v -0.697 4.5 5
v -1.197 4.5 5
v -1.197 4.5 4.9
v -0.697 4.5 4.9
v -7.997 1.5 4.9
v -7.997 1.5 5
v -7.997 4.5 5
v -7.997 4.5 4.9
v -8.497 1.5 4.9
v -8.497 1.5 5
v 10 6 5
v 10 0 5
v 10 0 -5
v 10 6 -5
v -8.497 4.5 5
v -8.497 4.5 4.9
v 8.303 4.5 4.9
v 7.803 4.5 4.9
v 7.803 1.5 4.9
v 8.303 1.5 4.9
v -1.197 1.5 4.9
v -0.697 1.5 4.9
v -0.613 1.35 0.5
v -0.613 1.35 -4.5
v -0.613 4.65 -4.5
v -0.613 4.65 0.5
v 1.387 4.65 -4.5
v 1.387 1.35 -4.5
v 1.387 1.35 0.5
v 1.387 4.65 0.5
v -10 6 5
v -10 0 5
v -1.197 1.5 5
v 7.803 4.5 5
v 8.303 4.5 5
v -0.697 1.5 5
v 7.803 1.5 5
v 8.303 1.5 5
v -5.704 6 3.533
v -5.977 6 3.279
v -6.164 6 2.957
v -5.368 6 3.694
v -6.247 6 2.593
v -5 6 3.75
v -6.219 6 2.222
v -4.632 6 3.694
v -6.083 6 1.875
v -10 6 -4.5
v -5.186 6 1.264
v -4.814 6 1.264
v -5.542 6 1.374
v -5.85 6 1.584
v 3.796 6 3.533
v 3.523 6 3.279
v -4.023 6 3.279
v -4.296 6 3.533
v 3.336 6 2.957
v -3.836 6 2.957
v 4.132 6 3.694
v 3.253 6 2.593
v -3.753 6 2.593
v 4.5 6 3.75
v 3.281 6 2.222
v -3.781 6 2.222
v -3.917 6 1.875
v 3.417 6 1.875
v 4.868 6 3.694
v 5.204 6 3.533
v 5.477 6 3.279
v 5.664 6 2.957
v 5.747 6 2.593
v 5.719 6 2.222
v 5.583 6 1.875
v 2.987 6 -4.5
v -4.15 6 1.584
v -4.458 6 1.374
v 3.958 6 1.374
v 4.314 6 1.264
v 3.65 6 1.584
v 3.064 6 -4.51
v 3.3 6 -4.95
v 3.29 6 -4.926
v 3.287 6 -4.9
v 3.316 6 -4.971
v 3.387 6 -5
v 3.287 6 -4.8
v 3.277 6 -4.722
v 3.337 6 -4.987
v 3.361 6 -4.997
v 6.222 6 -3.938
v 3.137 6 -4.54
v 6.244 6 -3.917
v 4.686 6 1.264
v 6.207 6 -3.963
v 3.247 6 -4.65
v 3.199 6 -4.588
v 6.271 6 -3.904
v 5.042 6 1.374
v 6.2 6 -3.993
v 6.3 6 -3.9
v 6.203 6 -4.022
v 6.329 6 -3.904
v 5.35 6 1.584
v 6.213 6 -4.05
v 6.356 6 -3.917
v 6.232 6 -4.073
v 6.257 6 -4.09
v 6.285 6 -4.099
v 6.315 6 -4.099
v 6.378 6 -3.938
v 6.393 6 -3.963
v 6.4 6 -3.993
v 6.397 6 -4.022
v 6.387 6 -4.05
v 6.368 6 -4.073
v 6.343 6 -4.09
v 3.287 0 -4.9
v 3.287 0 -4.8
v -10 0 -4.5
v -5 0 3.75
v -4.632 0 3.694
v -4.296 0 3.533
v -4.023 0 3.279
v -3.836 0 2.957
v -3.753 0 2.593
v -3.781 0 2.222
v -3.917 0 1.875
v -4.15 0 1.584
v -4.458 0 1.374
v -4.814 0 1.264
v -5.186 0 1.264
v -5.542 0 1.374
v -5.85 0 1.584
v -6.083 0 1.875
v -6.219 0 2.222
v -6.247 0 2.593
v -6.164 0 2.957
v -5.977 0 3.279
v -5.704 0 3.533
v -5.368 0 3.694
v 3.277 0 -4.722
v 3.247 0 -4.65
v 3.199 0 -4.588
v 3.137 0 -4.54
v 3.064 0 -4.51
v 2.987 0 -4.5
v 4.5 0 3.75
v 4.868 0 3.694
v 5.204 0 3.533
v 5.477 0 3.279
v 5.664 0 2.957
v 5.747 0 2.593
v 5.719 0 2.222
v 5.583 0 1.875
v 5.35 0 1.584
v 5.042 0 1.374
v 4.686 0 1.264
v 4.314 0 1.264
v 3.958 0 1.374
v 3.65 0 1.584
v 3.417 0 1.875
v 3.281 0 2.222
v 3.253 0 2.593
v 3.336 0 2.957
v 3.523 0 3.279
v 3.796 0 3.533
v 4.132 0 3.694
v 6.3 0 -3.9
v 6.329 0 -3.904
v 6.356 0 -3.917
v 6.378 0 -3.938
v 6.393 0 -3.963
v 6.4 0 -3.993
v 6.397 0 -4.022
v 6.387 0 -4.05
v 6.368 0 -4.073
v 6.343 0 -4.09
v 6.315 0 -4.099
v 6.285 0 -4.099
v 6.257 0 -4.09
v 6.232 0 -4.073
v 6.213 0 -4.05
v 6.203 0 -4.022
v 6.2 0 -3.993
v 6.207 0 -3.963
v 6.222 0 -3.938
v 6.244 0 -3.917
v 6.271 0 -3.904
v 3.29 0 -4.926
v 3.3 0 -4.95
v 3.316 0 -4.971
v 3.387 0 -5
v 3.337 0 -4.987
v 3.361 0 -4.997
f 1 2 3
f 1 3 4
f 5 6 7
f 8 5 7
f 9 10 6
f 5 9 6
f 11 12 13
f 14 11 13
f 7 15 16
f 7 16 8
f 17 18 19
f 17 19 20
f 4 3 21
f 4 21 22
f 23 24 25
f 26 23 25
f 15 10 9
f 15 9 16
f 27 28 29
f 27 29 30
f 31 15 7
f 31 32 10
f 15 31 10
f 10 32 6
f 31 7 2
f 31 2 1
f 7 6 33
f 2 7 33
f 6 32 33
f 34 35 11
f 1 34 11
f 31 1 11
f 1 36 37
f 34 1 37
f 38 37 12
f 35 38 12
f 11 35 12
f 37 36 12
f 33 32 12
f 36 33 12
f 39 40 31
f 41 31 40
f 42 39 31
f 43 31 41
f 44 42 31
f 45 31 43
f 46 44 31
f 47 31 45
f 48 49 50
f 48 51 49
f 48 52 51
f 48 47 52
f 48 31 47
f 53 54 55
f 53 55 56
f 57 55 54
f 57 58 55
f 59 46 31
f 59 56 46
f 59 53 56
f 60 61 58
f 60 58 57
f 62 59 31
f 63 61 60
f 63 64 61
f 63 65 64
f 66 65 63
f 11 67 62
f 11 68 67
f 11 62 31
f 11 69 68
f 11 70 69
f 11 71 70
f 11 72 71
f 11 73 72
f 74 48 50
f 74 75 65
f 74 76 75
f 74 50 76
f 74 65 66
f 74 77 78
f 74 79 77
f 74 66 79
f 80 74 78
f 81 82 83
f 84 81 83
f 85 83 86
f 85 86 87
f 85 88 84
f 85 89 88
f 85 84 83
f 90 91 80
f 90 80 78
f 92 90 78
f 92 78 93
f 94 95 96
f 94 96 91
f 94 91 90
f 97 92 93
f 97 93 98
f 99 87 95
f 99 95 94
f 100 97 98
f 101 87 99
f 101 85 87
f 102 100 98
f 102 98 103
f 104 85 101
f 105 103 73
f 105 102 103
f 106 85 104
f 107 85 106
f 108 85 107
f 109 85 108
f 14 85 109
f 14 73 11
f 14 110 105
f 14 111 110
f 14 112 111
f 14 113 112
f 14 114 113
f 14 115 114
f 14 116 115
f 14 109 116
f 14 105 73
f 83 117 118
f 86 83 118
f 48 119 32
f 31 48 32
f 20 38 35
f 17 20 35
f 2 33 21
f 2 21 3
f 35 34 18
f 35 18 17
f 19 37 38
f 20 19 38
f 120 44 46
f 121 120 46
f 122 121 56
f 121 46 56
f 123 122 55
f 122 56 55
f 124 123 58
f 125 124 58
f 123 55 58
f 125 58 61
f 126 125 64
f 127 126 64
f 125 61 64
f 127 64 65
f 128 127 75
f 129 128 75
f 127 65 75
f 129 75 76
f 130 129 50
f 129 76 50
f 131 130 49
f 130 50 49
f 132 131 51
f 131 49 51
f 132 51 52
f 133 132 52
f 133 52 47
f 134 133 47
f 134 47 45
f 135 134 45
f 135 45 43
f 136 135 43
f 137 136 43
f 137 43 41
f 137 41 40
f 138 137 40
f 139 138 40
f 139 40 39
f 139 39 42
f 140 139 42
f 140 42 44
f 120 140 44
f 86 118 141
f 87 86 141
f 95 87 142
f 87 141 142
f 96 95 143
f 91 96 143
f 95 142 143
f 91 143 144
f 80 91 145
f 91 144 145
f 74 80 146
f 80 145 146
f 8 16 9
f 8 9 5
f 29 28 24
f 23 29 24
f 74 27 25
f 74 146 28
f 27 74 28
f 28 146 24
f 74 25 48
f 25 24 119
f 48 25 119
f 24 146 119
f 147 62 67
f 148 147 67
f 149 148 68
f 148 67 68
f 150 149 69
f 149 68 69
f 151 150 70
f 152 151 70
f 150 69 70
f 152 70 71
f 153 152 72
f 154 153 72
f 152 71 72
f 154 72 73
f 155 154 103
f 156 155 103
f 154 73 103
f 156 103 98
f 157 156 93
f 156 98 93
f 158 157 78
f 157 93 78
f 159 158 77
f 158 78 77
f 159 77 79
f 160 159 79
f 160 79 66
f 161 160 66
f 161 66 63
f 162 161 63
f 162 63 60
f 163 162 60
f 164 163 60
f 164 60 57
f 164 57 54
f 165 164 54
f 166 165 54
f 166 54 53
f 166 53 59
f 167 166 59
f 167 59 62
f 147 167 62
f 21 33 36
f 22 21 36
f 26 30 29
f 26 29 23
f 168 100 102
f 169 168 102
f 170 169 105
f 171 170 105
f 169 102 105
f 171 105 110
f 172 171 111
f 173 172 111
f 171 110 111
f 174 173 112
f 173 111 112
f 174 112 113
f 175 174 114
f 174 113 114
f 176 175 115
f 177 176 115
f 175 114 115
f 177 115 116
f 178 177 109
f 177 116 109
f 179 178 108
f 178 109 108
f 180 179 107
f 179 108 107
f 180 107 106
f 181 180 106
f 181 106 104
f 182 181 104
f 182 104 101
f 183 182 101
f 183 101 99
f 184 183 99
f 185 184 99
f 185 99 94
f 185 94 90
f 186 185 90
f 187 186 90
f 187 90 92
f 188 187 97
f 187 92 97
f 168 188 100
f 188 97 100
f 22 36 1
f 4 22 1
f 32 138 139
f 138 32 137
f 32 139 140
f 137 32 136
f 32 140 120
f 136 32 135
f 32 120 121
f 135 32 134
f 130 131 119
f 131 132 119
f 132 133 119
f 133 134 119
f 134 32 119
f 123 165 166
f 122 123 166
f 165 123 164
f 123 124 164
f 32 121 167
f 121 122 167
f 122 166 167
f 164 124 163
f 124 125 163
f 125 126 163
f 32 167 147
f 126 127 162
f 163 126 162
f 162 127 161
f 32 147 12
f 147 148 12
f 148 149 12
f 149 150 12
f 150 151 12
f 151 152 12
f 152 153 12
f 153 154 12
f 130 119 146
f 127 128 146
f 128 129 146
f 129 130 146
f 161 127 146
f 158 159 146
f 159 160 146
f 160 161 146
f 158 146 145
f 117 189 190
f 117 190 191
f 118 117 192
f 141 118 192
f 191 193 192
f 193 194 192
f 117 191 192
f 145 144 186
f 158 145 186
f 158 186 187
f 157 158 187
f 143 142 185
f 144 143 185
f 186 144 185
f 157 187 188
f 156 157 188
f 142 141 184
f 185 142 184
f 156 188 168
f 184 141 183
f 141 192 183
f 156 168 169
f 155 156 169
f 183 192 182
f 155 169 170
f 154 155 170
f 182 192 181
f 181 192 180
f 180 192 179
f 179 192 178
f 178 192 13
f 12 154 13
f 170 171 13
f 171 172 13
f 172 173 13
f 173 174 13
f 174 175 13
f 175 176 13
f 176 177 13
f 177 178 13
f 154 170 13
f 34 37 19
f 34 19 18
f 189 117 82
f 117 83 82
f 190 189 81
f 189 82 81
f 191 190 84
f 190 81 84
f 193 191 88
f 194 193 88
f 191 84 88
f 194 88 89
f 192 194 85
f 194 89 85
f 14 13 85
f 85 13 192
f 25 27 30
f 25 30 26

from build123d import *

# Parameters (mm, degrees)
SALIENTE_EXTRUIR2_DEPTH = 6
CROQUIS2_R              = 1.25
CORTAR_EXTRUIR1_DEPTH   = 10
REDONDEO1_R             = 0.1
CROQUIS3_W              = 2
CROQUIS3_H              = 3.3
CORTAR_EXTRUIR2_DEPTH   = 5
CROQUIS4_R              = 0.1
CORTAR_EXTRUIR3_DEPTH   = 6
CROQUIS5_W              = 0.5
CROQUIS5_H              = 3
CORTAR_EXTRUIR4_DEPTH   = 0.1


with BuildPart() as part:
    # Croquis1 → Saliente-Extruir2 (new body)
    with BuildSketch(Plane(origin=(0, 0, 0), x_dir=(1, 0, 0), z_dir=(0, 1, 0))):
        with BuildLine():
            Line((2.986733927, 4.5), (-10, 4.5))
            Line((-10, 4.5), (-10, -5))
            Line((-10, -5), (10, -5))
            Line((10, -5), (10, 5))
            Line((10, 5), (3.286733927, 5))
            Line((3.286733927, 5), (3.286733927, 4.8))
            ThreePointArc((3.286733927, 4.8), (3.198865961, 4.587867966), (2.986733927, 4.5))
        make_face()
    extrude(amount=SALIENTE_EXTRUIR2_DEPTH)

    # Croquis2 → Cortar-Extruir1 (cut)
    with BuildSketch(Plane(origin=(0, 6, 0), x_dir=(1, 0, 0), z_dir=(0, 1, 0))):
        with Locations(Location((-5, -2.5, 0), (0, 0, 270))):
            Circle(CROQUIS2_R)
        with Locations(Location((4.5, -2.5, 0), (0, 0, 270))):
            Circle(CROQUIS2_R)
    extrude(amount=-CORTAR_EXTRUIR1_DEPTH, mode=Mode.SUBTRACT)

    # Redondeo1
    redondeo1_edges = [part.edges().sort_by_distance(p)[0] for p in [
        (3.286733927, 3, -5),
    ]]
    fillet(redondeo1_edges, radius=REDONDEO1_R)

    # Croquis3 → Cortar-Extruir2 (cut)
    with BuildSketch(Plane(origin=(0, 0, -4.5), x_dir=(-1, 0, 0), z_dir=(0, 0, -1))):
        with Locations((-0.386733927, 3)):
            Rectangle(CROQUIS3_W, CROQUIS3_H)
    extrude(amount=-CORTAR_EXTRUIR2_DEPTH, mode=Mode.SUBTRACT)

    # Croquis4 → Cortar-Extruir3 (cut)
    with BuildSketch(Plane(origin=(0, 6, 0), x_dir=(1, 0, 0), z_dir=(0, 1, 0))):
        with Locations(Location((6.3, 4, 0), (0, 0, 270))):
            Circle(CROQUIS4_R)
    extrude(amount=-CORTAR_EXTRUIR3_DEPTH, mode=Mode.SUBTRACT)

    # Croquis5 → Cortar-Extruir4 (cut)
    with BuildSketch(Plane.XY.offset(5)):
        with Locations((-8.247200411, 3)):
            Rectangle(CROQUIS5_W, CROQUIS5_H)
        with Locations((-0.947200411, 3)):
            Rectangle(CROQUIS5_W, CROQUIS5_H)
        with Locations((8.052799589, 3)):
            Rectangle(CROQUIS5_W, CROQUIS5_H)
    extrude(amount=-CORTAR_EXTRUIR4_DEPTH, mode=Mode.SUBTRACT)


solid = part.part
